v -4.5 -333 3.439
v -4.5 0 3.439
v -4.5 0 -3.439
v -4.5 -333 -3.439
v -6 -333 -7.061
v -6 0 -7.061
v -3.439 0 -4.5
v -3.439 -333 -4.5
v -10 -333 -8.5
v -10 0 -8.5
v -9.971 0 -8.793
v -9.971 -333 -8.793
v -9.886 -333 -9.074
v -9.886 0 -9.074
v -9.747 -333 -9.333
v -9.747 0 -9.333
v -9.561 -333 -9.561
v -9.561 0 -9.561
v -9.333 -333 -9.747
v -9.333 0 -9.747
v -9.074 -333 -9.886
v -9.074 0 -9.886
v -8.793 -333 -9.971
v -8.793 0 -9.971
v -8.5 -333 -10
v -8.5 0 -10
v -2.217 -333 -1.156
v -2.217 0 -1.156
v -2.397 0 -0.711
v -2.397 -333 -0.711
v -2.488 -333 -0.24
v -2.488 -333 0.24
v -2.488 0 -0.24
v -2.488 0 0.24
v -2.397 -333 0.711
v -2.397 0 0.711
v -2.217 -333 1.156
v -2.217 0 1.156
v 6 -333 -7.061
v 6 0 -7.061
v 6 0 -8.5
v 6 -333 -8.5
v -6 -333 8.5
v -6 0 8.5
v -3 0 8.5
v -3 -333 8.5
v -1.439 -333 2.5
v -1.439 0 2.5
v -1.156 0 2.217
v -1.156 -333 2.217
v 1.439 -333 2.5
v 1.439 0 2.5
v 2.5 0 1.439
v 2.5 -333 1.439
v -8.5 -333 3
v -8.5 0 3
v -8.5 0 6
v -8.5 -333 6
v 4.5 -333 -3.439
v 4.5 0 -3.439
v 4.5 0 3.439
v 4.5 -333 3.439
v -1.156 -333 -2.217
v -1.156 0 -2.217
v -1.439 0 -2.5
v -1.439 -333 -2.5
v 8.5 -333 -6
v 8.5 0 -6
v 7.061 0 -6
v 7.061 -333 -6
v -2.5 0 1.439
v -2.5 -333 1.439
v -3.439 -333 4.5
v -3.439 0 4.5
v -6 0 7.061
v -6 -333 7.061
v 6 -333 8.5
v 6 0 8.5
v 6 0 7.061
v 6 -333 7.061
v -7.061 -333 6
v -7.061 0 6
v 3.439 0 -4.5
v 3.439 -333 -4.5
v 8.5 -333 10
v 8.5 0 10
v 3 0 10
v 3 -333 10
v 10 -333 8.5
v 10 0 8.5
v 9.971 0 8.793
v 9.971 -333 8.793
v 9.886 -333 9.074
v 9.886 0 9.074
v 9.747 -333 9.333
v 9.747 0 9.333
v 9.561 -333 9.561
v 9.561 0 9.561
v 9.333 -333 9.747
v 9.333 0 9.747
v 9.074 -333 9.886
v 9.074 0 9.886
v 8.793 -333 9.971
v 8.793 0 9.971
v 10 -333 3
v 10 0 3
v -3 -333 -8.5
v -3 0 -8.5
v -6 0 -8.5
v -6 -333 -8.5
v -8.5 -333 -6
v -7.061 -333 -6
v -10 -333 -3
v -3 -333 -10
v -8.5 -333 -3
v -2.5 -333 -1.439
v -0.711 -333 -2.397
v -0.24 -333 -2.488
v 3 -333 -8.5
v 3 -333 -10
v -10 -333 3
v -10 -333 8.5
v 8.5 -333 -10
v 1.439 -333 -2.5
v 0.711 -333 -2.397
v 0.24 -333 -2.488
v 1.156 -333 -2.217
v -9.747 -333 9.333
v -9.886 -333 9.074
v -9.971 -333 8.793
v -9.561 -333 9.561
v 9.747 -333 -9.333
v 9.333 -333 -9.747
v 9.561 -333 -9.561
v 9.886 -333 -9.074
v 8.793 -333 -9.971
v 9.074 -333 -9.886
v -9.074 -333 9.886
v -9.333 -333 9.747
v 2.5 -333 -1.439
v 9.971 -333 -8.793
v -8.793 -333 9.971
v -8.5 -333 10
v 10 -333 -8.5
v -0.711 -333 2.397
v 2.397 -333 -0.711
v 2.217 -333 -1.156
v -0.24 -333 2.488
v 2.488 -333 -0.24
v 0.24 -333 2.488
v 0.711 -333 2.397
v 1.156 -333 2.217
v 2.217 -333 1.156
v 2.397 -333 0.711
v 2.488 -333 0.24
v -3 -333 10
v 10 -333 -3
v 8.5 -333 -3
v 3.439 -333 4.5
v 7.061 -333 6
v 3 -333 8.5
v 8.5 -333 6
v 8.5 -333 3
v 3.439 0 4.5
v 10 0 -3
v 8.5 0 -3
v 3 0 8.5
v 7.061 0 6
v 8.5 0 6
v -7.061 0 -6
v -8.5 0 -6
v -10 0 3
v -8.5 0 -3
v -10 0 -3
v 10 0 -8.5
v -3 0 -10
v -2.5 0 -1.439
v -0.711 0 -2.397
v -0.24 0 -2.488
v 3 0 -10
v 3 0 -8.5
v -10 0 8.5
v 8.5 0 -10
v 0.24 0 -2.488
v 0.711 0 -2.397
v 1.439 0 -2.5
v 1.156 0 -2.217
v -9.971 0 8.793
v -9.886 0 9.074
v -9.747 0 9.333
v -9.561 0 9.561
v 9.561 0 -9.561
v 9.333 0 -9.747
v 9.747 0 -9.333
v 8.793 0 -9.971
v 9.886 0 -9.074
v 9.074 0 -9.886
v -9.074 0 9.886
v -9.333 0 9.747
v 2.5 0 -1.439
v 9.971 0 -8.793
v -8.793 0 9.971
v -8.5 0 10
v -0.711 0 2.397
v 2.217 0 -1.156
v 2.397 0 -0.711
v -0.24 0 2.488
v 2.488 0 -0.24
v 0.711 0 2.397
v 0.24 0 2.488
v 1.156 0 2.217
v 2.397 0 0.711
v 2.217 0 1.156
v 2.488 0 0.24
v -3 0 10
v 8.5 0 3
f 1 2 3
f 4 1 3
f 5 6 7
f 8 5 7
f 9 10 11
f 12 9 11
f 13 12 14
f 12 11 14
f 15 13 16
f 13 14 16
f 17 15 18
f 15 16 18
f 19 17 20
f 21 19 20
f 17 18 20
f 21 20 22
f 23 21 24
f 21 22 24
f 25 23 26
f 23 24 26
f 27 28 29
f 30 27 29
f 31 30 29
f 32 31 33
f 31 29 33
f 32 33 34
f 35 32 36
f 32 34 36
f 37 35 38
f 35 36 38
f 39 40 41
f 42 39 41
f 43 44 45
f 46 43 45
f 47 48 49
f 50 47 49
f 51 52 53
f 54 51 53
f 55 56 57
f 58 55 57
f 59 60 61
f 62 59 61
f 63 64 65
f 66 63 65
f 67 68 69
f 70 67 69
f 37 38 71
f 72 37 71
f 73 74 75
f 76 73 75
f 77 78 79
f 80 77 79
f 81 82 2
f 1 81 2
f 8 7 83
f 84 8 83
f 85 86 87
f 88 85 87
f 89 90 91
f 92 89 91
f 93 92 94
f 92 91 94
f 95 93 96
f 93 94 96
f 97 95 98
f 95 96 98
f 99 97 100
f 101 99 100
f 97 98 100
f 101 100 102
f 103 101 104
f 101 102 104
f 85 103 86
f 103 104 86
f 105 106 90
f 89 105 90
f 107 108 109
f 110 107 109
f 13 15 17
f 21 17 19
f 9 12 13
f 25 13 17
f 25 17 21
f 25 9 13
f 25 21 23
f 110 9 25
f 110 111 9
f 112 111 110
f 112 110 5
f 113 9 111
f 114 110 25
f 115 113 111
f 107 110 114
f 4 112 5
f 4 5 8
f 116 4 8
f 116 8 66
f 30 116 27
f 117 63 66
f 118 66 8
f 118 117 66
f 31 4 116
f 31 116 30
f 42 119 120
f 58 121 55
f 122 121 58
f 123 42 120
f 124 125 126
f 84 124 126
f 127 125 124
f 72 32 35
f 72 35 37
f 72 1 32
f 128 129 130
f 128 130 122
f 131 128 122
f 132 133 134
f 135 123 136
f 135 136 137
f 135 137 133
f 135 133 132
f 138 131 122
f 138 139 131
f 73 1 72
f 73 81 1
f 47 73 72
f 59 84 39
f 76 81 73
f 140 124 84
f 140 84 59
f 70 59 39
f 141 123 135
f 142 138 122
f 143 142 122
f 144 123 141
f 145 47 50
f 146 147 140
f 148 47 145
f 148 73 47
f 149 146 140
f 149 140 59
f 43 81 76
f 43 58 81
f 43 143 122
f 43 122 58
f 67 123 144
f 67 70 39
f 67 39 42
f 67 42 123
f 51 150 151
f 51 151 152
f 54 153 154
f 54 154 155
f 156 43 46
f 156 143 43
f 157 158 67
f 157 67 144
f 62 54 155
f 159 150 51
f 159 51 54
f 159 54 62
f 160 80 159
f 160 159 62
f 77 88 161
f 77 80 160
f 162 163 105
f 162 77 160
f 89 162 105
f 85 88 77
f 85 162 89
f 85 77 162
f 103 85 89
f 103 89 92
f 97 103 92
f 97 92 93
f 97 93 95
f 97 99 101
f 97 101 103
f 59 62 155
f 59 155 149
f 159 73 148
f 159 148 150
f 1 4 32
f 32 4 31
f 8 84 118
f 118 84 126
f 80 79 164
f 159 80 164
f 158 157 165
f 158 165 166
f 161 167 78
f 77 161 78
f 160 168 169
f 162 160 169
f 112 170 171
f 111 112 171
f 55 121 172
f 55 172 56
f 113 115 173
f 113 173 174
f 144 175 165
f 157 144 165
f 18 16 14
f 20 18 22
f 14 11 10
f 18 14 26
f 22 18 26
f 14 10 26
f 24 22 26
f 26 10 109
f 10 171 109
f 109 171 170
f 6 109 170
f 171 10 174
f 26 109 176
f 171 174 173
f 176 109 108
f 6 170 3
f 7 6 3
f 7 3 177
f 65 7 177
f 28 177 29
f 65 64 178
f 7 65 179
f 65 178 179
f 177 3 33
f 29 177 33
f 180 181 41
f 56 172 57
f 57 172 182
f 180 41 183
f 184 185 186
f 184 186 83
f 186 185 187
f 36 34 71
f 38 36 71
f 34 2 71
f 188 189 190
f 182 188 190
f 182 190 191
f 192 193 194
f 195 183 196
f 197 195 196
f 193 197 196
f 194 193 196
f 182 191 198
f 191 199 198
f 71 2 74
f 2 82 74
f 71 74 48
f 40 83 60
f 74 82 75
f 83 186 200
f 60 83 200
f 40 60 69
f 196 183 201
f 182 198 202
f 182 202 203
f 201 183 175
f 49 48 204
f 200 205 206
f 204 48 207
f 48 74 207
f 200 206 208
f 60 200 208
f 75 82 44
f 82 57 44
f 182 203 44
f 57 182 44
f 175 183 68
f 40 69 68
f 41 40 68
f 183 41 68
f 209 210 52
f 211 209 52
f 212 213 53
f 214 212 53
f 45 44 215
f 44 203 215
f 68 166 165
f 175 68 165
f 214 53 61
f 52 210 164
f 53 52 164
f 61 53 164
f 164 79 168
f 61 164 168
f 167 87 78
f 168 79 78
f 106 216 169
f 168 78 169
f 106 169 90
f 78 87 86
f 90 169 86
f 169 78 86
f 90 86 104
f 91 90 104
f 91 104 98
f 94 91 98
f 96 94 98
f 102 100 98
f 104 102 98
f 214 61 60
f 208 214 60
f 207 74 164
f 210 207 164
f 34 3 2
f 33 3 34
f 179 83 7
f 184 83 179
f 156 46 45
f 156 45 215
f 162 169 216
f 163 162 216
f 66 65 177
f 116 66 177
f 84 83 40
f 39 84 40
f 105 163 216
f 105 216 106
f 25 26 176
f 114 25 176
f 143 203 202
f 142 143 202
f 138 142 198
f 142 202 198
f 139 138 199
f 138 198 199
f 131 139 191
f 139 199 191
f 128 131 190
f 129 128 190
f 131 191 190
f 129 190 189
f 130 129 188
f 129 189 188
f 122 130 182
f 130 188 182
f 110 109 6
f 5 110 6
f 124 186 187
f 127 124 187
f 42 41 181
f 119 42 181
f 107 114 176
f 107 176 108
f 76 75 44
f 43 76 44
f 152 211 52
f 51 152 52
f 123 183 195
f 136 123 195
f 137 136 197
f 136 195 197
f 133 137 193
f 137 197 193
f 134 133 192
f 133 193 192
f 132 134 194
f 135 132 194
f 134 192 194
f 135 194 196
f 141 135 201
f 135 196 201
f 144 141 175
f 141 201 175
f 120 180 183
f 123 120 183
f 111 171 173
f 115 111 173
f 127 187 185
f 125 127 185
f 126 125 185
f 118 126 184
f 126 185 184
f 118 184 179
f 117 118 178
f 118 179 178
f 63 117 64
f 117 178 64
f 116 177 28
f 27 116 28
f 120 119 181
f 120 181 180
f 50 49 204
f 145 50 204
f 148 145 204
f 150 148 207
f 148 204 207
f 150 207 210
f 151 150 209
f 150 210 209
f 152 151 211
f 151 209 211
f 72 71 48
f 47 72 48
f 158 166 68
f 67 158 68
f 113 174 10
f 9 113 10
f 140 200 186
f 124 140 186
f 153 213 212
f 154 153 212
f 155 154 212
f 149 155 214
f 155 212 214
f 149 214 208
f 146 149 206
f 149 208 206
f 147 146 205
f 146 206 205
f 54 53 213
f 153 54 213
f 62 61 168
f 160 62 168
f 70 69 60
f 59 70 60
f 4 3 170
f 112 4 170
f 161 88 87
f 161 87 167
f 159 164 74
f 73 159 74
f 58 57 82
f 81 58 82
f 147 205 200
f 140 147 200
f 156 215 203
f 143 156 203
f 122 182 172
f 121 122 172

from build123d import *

# Parameters (mm, degrees)
F1_DEPTH = 333


with BuildPart() as f1:
    # F0 (on Front) → F1 (new body)
    with BuildSketch(Plane.XZ):
        with BuildLine():
            Line((3, -10), (8.5, -10))
            ThreePointArc((8.5, -10), (9.5606601718, -9.5606601718), (10, -8.5))
            Line((10, -8.5), (10, -3))
            Line((10, -3), (8.5, -3))
            Line((8.5, -3), (8.5, -6))
            Line((8.5, -6), (7.0606601718, -6))
            Line((7.0606601718, -6), (4.5, -3.4393398282))
            Line((4.5, -3.4393398282), (4.5, 3.4393398282))
            Line((4.5, 3.4393398282), (7.0606601718, 6))
            Line((7.0606601718, 6), (8.5, 6))
            Line((8.5, 6), (8.5, 3))
            Line((8.5, 3), (10, 3))
            Line((10, 3), (10, 8.5))
            ThreePointArc((10, 8.5), (9.5606601718, 9.5606601718), (8.5, 10))
            Line((8.5, 10), (3, 10))
            Line((3, 10), (3, 8.5))
            Line((3, 8.5), (6, 8.5))
            Line((6, 8.5), (6, 7.0606601718))
            Line((6, 7.0606601718), (3.4393398282, 4.5))
            Line((3.4393398282, 4.5), (-3.4393398282, 4.5))
            Line((-3.4393398282, 4.5), (-6, 7.0606601718))
            Line((-6, 7.0606601718), (-6, 8.5))
            Line((-6, 8.5), (-3, 8.5))
            Line((-3, 8.5), (-3, 10))
            Line((-3, 10), (-8.5, 10))
            ThreePointArc((-8.5, 10), (-9.5606601718, 9.5606601718), (-10, 8.5))
            Line((-10, 8.5), (-10, 3))
            Line((-10, 3), (-8.5, 3))
            Line((-8.5, 3), (-8.5, 6))
            Line((-8.5, 6), (-7.0606601718, 6))
            Line((-7.0606601718, 6), (-4.5, 3.4393398282))
            Line((-4.5, 3.4393398282), (-4.5, -3.4393398282))
            Line((-4.5, -3.4393398282), (-7.0606601718, -6))
            Line((-7.0606601718, -6), (-8.5, -6))
            Line((-8.5, -6), (-8.5, -3))
            Line((-8.5, -3), (-10, -3))
            Line((-10, -3), (-10, -8.5))
            ThreePointArc((-10, -8.5), (-9.5606601718, -9.5606601718), (-8.5, -10))
            Line((-8.5, -10), (-3, -10))
            Line((-3, -10), (-3, -8.5))
            Line((-3, -8.5), (-6, -8.5))
            Line((-6, -8.5), (-6, -7.0606601718))
            Line((-6, -7.0606601718), (-3.4393398282, -4.5))
            Line((-3.4393398282, -4.5), (3.4393398282, -4.5))
            Line((3.4393398282, -4.5), (6, -7.0606601718))
            Line((6, -7.0606601718), (6, -8.5))
            Line((6, -8.5), (3, -8.5))
            Line((3, -8.5), (3, -10))
        make_face()
        with BuildLine():
            ThreePointArc((-1.1560121095, 2.2166722813), (0, 2.5), (1.1560121095, 2.2166722813))
            Line((1.1560121095, 2.2166722813), (1.4393398282, 2.5))
            Line((1.4393398282, 2.5), (2.5, 1.4393398282))
            Line((2.5, 1.4393398282), (2.2166722813, 1.1560121095))
            ThreePointArc((2.2166722813, 1.1560121095), (2.5, 0), (2.2166722813, -1.1560121095))
            Line((2.2166722813, -1.1560121095), (2.5, -1.4393398282))
            Line((2.5, -1.4393398282), (1.4393398282, -2.5))
            Line((1.4393398282, -2.5), (1.1560121095, -2.2166722813))
            ThreePointArc((1.1560121095, -2.2166722813), (0, -2.5), (-1.1560121095, -2.2166722813))
            Line((-1.1560121095, -2.2166722813), (-1.4393398282, -2.5))
            Line((-1.4393398282, -2.5), (-2.5, -1.4393398282))
            Line((-2.5, -1.4393398282), (-2.2166722813, -1.1560121095))
            ThreePointArc((-2.2166722813, -1.1560121095), (-2.5, 0), (-2.2166722813, 1.1560121095))
            Line((-2.2166722813, 1.1560121095), (-2.5, 1.4393398282))
            Line((-2.5, 1.4393398282), (-1.4393398282, 2.5))
            Line((-1.4393398282, 2.5), (-1.1560121095, 2.2166722813))
        make_face(mode=Mode.SUBTRACT)
    extrude(amount=F1_DEPTH)


solid = f1.part
